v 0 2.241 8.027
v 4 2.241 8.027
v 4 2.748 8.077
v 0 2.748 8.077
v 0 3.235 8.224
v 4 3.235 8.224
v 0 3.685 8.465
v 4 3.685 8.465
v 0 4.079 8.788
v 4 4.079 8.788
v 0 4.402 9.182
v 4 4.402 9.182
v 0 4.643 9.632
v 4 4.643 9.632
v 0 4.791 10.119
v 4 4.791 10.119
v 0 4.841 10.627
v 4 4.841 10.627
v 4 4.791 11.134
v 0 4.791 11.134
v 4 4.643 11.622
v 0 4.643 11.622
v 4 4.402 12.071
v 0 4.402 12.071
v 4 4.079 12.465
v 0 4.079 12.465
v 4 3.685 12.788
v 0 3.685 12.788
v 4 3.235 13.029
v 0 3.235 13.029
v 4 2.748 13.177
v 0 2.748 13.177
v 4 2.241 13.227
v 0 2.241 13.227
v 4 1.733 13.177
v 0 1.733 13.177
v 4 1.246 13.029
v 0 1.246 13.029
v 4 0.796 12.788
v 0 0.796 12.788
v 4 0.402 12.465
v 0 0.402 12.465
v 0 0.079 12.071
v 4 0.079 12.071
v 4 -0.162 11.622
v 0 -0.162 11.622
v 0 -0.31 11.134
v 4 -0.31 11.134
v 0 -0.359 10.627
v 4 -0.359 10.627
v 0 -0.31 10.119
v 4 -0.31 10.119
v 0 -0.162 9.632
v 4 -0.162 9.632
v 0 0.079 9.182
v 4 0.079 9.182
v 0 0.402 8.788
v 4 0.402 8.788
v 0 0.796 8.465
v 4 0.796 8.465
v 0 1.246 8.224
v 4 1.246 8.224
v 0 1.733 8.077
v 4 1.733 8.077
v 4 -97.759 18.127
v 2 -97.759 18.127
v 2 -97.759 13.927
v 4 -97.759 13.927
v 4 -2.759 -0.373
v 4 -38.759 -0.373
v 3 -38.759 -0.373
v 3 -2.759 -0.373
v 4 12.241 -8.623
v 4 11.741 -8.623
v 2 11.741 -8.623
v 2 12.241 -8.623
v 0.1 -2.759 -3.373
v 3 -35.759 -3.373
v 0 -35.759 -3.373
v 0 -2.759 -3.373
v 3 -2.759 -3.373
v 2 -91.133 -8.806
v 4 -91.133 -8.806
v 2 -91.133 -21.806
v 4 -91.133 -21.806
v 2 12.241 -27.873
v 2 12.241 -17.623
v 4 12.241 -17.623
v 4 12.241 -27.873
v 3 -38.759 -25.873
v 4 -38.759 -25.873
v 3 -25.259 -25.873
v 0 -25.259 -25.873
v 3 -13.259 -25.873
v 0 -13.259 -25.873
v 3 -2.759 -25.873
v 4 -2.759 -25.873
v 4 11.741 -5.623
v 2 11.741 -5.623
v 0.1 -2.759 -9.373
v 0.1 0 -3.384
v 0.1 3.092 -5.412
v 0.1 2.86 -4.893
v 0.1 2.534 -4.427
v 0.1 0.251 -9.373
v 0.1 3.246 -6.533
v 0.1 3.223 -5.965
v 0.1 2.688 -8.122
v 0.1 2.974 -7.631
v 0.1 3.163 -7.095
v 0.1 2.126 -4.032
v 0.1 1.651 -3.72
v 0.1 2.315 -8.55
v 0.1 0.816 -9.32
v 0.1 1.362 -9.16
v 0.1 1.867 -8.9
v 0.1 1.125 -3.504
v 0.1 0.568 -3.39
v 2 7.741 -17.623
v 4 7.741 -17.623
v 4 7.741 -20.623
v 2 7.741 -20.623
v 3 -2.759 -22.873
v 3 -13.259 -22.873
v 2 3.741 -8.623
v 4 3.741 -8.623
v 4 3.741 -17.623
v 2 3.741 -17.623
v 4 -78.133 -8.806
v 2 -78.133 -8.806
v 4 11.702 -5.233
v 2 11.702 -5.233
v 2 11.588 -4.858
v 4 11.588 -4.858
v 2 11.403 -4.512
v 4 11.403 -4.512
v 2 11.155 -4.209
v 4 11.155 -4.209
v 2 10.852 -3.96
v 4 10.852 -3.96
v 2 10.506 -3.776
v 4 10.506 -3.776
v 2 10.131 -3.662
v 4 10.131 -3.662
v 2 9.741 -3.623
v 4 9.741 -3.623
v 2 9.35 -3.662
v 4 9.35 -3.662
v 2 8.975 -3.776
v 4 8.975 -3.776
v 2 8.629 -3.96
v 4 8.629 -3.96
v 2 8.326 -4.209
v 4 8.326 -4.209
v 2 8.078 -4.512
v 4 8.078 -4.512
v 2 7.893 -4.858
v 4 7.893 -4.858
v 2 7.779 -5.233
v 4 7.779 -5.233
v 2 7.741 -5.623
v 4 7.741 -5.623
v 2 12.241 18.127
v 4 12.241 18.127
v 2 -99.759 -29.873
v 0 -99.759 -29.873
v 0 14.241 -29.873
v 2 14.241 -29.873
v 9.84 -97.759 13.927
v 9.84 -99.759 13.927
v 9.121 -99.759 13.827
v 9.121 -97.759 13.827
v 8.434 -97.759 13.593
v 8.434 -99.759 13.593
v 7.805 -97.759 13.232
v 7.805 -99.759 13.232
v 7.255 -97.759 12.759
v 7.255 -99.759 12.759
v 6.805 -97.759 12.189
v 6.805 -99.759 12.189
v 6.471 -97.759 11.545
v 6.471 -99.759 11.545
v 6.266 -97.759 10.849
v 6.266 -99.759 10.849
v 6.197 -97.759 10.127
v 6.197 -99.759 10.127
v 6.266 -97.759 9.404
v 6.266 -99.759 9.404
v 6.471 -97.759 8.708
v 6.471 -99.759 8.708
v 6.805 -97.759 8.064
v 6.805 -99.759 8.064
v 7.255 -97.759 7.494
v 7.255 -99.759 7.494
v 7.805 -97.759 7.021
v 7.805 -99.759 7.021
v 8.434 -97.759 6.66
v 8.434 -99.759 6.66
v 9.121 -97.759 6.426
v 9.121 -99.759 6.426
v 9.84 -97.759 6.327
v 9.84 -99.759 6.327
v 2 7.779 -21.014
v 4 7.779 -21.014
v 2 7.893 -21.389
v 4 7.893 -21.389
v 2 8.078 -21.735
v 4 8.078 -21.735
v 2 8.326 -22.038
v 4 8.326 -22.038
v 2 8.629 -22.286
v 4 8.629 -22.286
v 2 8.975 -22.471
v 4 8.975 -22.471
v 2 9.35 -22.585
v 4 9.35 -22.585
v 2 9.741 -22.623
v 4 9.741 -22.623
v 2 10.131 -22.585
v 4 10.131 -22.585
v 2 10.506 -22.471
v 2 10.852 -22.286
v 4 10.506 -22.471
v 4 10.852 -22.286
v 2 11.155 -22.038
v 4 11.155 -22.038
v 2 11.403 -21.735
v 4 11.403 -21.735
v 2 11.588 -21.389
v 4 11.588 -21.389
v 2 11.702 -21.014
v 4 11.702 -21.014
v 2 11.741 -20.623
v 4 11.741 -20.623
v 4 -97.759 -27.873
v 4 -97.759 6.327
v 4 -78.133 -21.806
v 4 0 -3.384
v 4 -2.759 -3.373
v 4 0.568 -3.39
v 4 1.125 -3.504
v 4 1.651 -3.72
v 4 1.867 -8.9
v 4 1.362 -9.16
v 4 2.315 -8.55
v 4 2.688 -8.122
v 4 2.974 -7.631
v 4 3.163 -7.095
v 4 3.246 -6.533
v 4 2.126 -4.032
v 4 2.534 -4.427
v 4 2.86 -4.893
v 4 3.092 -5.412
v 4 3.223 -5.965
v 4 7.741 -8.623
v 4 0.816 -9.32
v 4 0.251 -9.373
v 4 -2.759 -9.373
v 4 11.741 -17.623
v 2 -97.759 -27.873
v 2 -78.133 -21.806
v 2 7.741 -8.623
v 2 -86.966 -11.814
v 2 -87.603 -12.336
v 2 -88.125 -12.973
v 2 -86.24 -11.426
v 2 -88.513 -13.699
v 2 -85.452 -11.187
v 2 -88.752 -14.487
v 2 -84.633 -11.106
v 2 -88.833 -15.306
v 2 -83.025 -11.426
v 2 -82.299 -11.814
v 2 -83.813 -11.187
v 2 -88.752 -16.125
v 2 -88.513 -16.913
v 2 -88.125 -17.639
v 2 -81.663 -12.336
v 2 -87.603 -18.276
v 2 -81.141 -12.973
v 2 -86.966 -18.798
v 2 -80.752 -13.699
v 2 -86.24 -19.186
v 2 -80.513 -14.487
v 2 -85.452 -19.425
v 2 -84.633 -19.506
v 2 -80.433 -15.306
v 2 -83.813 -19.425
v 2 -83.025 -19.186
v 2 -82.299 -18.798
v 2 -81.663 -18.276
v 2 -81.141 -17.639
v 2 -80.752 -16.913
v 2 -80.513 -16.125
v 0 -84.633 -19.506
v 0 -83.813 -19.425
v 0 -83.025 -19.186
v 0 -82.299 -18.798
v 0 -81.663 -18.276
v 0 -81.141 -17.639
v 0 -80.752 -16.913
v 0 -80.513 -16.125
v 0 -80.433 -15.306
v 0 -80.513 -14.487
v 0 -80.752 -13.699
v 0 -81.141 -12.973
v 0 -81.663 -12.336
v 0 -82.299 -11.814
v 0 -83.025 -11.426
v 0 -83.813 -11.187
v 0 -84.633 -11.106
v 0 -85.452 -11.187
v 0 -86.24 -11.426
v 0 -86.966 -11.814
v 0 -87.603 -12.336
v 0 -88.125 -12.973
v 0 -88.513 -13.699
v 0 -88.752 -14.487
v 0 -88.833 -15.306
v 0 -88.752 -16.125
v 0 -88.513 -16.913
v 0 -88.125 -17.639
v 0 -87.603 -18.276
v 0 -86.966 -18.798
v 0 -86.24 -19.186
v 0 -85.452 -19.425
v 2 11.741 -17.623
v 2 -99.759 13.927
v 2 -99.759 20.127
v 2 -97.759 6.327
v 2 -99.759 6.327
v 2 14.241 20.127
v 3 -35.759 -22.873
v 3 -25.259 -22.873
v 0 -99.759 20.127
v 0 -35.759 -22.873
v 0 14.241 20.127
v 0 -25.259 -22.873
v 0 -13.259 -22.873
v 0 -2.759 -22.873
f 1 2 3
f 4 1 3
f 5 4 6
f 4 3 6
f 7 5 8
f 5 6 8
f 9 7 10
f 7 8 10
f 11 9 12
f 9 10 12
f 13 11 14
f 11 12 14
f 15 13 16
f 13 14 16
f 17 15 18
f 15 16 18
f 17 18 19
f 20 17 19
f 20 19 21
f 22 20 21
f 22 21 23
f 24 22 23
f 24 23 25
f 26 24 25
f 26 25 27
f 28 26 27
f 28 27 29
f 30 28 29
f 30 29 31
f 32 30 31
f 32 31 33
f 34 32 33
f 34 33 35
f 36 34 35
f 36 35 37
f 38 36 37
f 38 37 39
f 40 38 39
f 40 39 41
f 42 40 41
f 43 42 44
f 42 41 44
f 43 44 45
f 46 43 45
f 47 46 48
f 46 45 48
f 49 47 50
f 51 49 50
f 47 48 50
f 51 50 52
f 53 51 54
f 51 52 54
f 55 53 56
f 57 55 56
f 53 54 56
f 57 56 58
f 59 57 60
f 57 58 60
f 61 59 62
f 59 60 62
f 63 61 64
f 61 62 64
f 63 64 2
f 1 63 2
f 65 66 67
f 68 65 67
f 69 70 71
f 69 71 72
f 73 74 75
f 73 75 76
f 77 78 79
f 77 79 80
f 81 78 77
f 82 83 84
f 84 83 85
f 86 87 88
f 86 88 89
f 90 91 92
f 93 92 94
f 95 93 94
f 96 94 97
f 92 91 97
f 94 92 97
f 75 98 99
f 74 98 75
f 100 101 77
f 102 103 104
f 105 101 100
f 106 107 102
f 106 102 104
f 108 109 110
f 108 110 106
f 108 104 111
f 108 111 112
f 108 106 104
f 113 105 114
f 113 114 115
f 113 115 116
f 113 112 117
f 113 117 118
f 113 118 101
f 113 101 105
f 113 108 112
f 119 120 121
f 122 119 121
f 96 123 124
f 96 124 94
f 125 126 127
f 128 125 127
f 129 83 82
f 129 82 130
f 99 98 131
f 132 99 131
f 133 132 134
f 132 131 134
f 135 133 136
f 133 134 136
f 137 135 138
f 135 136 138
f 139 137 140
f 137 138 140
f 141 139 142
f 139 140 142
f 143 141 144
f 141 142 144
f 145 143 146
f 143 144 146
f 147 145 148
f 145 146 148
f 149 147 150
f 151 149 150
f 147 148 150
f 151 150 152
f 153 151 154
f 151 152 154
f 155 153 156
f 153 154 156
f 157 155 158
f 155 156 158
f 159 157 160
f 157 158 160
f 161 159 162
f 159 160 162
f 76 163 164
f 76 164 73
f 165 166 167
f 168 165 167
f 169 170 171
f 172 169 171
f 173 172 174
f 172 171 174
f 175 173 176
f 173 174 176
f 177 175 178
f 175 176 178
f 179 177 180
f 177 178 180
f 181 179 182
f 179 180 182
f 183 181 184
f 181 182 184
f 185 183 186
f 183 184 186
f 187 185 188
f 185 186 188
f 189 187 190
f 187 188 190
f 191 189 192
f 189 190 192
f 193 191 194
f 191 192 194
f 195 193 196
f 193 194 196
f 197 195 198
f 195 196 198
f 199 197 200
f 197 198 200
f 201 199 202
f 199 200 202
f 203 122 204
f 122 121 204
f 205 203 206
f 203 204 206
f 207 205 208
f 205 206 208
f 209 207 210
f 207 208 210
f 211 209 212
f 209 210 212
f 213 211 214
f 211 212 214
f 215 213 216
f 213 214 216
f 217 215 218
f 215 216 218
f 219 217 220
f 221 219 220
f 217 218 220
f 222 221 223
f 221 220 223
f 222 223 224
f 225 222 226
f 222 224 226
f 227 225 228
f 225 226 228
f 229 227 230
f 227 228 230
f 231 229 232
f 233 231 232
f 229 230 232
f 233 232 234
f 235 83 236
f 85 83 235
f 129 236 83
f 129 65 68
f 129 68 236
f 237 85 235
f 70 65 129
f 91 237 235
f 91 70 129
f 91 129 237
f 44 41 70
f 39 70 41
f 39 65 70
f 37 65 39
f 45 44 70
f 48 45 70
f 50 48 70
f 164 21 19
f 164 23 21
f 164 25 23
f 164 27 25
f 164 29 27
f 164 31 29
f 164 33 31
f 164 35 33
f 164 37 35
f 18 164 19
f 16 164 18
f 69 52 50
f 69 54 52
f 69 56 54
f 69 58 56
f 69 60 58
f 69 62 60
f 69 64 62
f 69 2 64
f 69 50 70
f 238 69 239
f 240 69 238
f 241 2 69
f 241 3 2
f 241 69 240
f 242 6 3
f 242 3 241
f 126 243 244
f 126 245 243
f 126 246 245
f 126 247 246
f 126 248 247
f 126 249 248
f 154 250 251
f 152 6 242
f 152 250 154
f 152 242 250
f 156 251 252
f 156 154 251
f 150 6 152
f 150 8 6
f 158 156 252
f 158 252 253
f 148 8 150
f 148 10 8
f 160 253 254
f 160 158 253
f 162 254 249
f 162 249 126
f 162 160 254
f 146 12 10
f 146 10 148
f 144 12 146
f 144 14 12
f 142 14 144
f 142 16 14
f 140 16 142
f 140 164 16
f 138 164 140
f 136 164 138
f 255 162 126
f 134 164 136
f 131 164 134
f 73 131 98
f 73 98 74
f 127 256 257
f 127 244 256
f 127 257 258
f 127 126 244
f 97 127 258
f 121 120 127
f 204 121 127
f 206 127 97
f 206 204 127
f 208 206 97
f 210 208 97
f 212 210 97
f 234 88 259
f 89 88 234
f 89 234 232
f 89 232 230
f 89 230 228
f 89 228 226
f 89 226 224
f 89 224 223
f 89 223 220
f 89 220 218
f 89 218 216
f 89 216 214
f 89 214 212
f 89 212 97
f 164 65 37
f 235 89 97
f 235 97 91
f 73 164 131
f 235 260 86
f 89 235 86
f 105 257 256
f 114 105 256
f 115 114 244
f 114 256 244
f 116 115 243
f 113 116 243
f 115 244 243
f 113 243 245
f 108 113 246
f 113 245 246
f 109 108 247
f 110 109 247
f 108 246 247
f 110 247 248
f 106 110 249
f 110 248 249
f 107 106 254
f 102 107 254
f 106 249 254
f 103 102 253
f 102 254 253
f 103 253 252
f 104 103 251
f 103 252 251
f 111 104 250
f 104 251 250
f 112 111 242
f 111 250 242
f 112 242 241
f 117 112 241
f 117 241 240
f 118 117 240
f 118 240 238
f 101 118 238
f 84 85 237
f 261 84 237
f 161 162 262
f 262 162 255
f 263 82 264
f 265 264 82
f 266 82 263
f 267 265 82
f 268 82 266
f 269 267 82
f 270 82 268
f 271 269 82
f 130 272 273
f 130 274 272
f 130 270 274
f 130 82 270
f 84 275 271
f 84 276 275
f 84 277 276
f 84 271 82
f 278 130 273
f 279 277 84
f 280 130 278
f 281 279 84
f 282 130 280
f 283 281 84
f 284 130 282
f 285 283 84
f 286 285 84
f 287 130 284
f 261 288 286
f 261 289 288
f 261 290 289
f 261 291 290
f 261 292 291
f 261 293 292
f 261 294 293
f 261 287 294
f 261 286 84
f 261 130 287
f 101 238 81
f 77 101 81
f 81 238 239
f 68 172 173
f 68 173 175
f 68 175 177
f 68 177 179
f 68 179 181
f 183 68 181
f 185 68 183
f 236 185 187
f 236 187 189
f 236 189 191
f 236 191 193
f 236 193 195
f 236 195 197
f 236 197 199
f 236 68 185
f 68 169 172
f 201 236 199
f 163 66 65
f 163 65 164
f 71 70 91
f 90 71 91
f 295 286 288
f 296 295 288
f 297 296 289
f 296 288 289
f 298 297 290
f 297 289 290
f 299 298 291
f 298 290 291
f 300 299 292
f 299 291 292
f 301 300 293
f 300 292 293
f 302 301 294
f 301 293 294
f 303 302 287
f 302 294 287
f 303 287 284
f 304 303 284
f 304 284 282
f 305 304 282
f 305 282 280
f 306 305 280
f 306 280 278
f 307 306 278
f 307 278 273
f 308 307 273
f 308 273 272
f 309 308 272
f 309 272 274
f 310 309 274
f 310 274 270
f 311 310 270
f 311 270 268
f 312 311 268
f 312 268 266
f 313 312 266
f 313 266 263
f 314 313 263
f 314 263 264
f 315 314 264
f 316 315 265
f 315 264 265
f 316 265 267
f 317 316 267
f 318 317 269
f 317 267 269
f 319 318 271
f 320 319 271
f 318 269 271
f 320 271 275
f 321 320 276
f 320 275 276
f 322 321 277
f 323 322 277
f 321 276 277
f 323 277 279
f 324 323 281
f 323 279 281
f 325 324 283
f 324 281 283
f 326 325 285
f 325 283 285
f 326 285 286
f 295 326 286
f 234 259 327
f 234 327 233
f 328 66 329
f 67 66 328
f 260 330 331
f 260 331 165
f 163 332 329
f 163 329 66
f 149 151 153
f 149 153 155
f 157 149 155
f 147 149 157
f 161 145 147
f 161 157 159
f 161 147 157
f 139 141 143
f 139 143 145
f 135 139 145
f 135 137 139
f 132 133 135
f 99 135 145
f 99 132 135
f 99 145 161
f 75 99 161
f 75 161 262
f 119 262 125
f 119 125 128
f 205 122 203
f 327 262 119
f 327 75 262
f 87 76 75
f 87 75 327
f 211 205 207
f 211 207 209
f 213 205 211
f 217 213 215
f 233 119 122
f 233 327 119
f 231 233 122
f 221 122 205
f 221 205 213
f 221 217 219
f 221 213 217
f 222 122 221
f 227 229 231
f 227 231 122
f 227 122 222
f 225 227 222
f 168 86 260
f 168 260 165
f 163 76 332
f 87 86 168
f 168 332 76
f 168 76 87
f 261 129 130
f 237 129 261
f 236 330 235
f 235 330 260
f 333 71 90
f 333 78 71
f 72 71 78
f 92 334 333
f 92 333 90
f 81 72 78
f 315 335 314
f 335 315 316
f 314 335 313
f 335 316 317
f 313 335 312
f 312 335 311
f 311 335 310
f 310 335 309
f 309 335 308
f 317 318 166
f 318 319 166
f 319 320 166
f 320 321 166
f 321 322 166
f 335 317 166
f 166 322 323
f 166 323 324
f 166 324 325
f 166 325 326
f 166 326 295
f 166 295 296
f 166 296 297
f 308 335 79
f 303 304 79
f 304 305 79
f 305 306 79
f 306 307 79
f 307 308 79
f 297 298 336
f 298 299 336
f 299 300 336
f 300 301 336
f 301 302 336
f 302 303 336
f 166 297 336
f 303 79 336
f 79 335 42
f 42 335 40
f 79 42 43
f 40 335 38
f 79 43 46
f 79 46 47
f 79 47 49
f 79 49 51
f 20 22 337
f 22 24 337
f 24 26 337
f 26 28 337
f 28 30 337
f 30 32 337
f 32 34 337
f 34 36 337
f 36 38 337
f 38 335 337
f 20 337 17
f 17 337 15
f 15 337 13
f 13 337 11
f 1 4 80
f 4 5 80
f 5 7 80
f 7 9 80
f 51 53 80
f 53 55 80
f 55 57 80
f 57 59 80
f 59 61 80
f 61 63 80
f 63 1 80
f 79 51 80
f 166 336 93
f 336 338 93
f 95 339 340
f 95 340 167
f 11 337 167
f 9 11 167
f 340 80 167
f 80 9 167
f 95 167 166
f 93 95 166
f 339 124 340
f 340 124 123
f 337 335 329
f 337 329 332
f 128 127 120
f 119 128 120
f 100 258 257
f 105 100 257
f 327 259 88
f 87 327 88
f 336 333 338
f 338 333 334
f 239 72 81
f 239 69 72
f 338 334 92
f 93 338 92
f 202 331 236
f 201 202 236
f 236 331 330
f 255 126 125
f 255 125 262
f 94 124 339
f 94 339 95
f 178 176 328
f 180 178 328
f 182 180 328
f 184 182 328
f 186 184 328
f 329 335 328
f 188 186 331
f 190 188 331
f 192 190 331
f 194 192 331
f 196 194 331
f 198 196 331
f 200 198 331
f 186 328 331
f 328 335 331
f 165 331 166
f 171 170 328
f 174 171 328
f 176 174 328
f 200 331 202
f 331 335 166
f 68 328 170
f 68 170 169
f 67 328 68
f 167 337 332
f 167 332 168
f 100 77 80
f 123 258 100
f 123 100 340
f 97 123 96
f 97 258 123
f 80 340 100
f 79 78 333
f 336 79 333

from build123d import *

# Parameters (mm, degrees)
SKIZZE1_W                        = 50
SKIZZE1_H                        = 114
AUFSATZ_LINEAR_AUSTRAGEN1_DEPTH  = 2
SKIZZE2_W                        = 46
SKIZZE2_H                        = 110
AUFSATZ_LINEAR_AUSTRAGEN2_DEPTH  = 2
SCHNITT_LINEAR_AUSTRAGEN1_REACH  = 106.213
SKIZZE3_W                        = 19.5
SKIZZE3_H                        = 33
SKIZZE4_W                        = 25.5
SKIZZE4_H                        = 33
SCHNITT_LINEAR_AUSTRAGEN2_DEPTH  = 1
SKIZZE5_R                        = 3
SCHNITT_LINEAR_AUSTRAGEN3_DEPTH  = 3.9
SCHNITT_LINEAR_AUSTRAGEN4_REACH  = 106.18
SKIZZE6_W                        = 3
SKIZZE6_H                        = 12
SKIZZE10_W                       = 9
SKIZZE10_H                       = 4
SCHNITT_LINEAR_AUSTRAGEN5_DEPTH  = 2
SKIZZE11_R                       = 2
SCHNITT_LINEAR_AUSTRAGEN6_DEPTH  = 2
SKIZZE13_R                       = 2.6
SCHNITT_LINEAR_AUSTRAGEN7_DEPTH  = 105.213135755
SKIZZE14_W                       = 7.6
SKIZZE14_H                       = 2
AUFSATZ_LINEAR_AUSTRAGEN3_DEPTH  = 8
SCHNITT_LINEAR_AUSTRAGEN8_REACH  = 120.273
SKIZZE15_R                       = 3.8033663
SKIZZE16_W                       = 25.5
SKIZZE16_H                       = 3
SCHNITT_LINEAR_AUSTRAGEN10_DEPTH = 1
SKIZZE21_W                       = 13
SKIZZE21_H                       = 13
SCHNITT_LINEAR_AUSTRAGEN11_DEPTH = 2
SCHNITT_LINEAR_AUSTRAGEN12_REACH = 106.431
SKIZZE22_R                       = 4.2
SKIZZE23_W                       = 3
SKIZZE23_H                       = 4
SCHNITT_LINEAR_AUSTRAGEN13_DEPTH = 2
SKIZZE26_W                       = 9
SKIZZE26_H                       = 4.5
SCHNITT_LINEAR_AUSTRAGEN18_DEPTH = 2


with BuildPart() as part:
    # Skizze1 → Aufsatz-Linear austragen1 (new body)
    with BuildSketch(Plane(origin=(0, 0, 0), x_dir=(0, 0, -1), z_dir=(1, 0, 0))):
        with Locations((4.873417722, -42.759493671)):
            Rectangle(SKIZZE1_W, SKIZZE1_H)
    extrude(amount=AUFSATZ_LINEAR_AUSTRAGEN1_DEPTH)

    # Skizze2 → Aufsatz-Linear austragen2 (add)
    with BuildSketch(Plane(origin=(2, 0, 0), x_dir=(0, 0, -1), z_dir=(1, 0, 0))):
        with Locations((4.873417722, -42.759493671)):
            Rectangle(SKIZZE2_W, SKIZZE2_H)
    extrude(amount=AUFSATZ_LINEAR_AUSTRAGEN2_DEPTH)

    # Skizze3 → Schnitt-Linear austragen1 (cut, up to next)
    with BuildSketch(Plane(origin=(4, 0, 0), x_dir=(0, 0, -1), z_dir=(1, 0, 0)), mode=Mode.PRIVATE) as schnitt_linear_austragen1_sk1:
        with Locations((13.123417722, -19.259493671)):
            Rectangle(SKIZZE3_W, SKIZZE3_H)
    schnitt_linear_austragen1_tool1 = extrude(schnitt_linear_austragen1_sk1.sketch, amount=-SCHNITT_LINEAR_AUSTRAGEN1_REACH, mode=Mode.PRIVATE) & part.part
    add(schnitt_linear_austragen1_tool1.solids().sort_by_distance((4, -19.259494, -13.123418))[0], mode=Mode.SUBTRACT)

    # Skizze4 → Schnitt-Linear austragen2 (cut)
    with BuildSketch(Plane(origin=(4, 0, 0), x_dir=(0, 0, -1), z_dir=(1, 0, 0))):
        with Locations((13.123417722, -19.259493671)):
            Rectangle(SKIZZE4_W, SKIZZE4_H)
    extrude(amount=-SCHNITT_LINEAR_AUSTRAGEN2_DEPTH, mode=Mode.SUBTRACT)

    # Skizze5 → Schnitt-Linear austragen3 (cut)
    with BuildSketch(Plane(origin=(4, 0, 0), x_dir=(0, 0, -1), z_dir=(1, 0, 0))):
        with BuildLine():
            ThreePointArc((9.373417722, 0.250506329), (6.498780388, -2.746873227), (3.38389492, 0))
            Line((3.38389492, 0), (3.373417722, -2.759493671))
            Line((3.373417722, -2.759493671), (9.373417722, -2.759493671))
            Line((9.373417722, -2.759493671), (9.373417722, 0.250506329))
        make_face()
        with Locations((6.373417722, 0.250506329)):
            Circle(SKIZZE5_R)
    extrude(amount=-SCHNITT_LINEAR_AUSTRAGEN3_DEPTH, mode=Mode.SUBTRACT)

    # Skizze6 → Schnitt-Linear austragen4 (cut, up to next)
    with BuildSketch(Plane(origin=(3, 0, 0), x_dir=(0, 0, -1), z_dir=(1, 0, 0)), mode=Mode.PRIVATE) as schnitt_linear_austragen4_sk1:
        with Locations((24.373417722, -19.259493671)):
            Rectangle(SKIZZE6_W, SKIZZE6_H)
    schnitt_linear_austragen4_tool1 = extrude(schnitt_linear_austragen4_sk1.sketch, amount=-SCHNITT_LINEAR_AUSTRAGEN4_REACH, mode=Mode.PRIVATE) & part.part
    add(schnitt_linear_austragen4_tool1.solids().sort_by_distance((3, -19.259494, -24.373418))[0], mode=Mode.SUBTRACT)

    # Skizze10 → Schnitt-Linear austragen5 (cut)
    with BuildSketch(Plane(origin=(4, 0, 0), x_dir=(0, 0, -1), z_dir=(1, 0, 0))):
        with Locations((13.123417722, 10.240506329)):
            Rectangle(SKIZZE10_W, SKIZZE10_H)
    extrude(amount=-SCHNITT_LINEAR_AUSTRAGEN5_DEPTH, mode=Mode.SUBTRACT)

    # Skizze11 → Schnitt-Linear austragen6 (cut)
    with BuildSketch(Plane(origin=(4, 0, 0), x_dir=(0, 0, -1), z_dir=(1, 0, 0))):
        with Locations((20.623417722, 9.740506329)):
            Circle(SKIZZE11_R)
        with Locations((5.623417722, 9.740506329)):
            Circle(SKIZZE11_R)
    extrude(amount=-SCHNITT_LINEAR_AUSTRAGEN6_DEPTH, mode=Mode.SUBTRACT)

    # Skizze13 → Schnitt-Linear austragen7 (cut, through all)
    with BuildSketch(Plane(origin=(4, 0, 0), x_dir=(0, 0, -1), z_dir=(1, 0, 0))):
        with Locations((-10.626582278, 2.240506329)):
            Circle(SKIZZE13_R)
    extrude(amount=-SCHNITT_LINEAR_AUSTRAGEN7_DEPTH, mode=Mode.SUBTRACT)

    # Skizze14 → Aufsatz-Linear austragen3 (add)
    with BuildSketch(Plane(origin=(2, 0, 0), x_dir=(0, 0, -1), z_dir=(1, 0, 0))):
        with Locations((-10.126582278, -98.759493671)):
            Rectangle(SKIZZE14_W, SKIZZE14_H)
    extrude(amount=AUFSATZ_LINEAR_AUSTRAGEN3_DEPTH)

    # Skizze15 → Schnitt-Linear austragen8 (cut, up to next)
    with BuildSketch(Plane.XZ.offset(99.759493671), mode=Mode.PRIVATE) as schnitt_linear_austragen8_sk1:
        with Locations((10, 10.126582278)):
            Circle(SKIZZE15_R)
    schnitt_linear_austragen8_tool1 = extrude(schnitt_linear_austragen8_sk1.sketch, amount=-SCHNITT_LINEAR_AUSTRAGEN8_REACH, mode=Mode.PRIVATE) & part.part
    add(schnitt_linear_austragen8_tool1.solids().sort_by_distance((10, -99.759494, 10.126582))[0], mode=Mode.SUBTRACT)

    # Skizze16 → Schnitt-Linear austragen10 (cut)
    with BuildSketch(Plane(origin=(4, 0, 0), x_dir=(0, 0, -1), z_dir=(1, 0, 0))):
        with Locations((13.123417722, -37.259493671)):
            Rectangle(SKIZZE16_W, SKIZZE16_H)
    extrude(amount=-SCHNITT_LINEAR_AUSTRAGEN10_DEPTH, mode=Mode.SUBTRACT)

    # Skizze21 → Schnitt-Linear austragen11 (cut)
    with BuildSketch(Plane(origin=(4, 0, 0), x_dir=(0, 0, -1), z_dir=(1, 0, 0))):
        with Locations((15.306102693, -84.632709468)):
            Rectangle(SKIZZE21_W, SKIZZE21_H)
    extrude(amount=-SCHNITT_LINEAR_AUSTRAGEN11_DEPTH, mode=Mode.SUBTRACT)

    # Skizze22 → Schnitt-Linear austragen12 (cut, up to next)
    with BuildSketch(Plane(origin=(2, 0, 0), x_dir=(0, 0, -1), z_dir=(1, 0, 0)), mode=Mode.PRIVATE) as schnitt_linear_austragen12_sk1:
        with Locations((15.306102693, -84.632709468)):
            Circle(SKIZZE22_R)
    schnitt_linear_austragen12_tool1 = extrude(schnitt_linear_austragen12_sk1.sketch, amount=-SCHNITT_LINEAR_AUSTRAGEN12_REACH, mode=Mode.PRIVATE) & part.part
    add(schnitt_linear_austragen12_tool1.solids().sort_by_distance((2, -84.632709, -15.306103))[0], mode=Mode.SUBTRACT)

    # Skizze23 → Schnitt-Linear austragen13 (cut)
    with BuildSketch(Plane(origin=(4, 0, 0), x_dir=(0, 0, -1), z_dir=(1, 0, 0))):
        with Locations((7.123417722, 9.740506329)):
            Rectangle(SKIZZE23_W, SKIZZE23_H)
        with Locations((19.123417722, 9.740506329)):
            Rectangle(SKIZZE23_W, SKIZZE23_H)
    extrude(amount=-SCHNITT_LINEAR_AUSTRAGEN13_DEPTH, mode=Mode.SUBTRACT)

    # Skizze26 → Schnitt-Linear austragen18 (cut)
    with BuildSketch(Plane(origin=(4, 0, 0), x_dir=(0, 0, -1), z_dir=(1, 0, 0))):
        with Locations((13.123417722, 5.990506329)):
            Rectangle(SKIZZE26_W, SKIZZE26_H)
    extrude(amount=-SCHNITT_LINEAR_AUSTRAGEN18_DEPTH, mode=Mode.SUBTRACT)


solid = part.part
